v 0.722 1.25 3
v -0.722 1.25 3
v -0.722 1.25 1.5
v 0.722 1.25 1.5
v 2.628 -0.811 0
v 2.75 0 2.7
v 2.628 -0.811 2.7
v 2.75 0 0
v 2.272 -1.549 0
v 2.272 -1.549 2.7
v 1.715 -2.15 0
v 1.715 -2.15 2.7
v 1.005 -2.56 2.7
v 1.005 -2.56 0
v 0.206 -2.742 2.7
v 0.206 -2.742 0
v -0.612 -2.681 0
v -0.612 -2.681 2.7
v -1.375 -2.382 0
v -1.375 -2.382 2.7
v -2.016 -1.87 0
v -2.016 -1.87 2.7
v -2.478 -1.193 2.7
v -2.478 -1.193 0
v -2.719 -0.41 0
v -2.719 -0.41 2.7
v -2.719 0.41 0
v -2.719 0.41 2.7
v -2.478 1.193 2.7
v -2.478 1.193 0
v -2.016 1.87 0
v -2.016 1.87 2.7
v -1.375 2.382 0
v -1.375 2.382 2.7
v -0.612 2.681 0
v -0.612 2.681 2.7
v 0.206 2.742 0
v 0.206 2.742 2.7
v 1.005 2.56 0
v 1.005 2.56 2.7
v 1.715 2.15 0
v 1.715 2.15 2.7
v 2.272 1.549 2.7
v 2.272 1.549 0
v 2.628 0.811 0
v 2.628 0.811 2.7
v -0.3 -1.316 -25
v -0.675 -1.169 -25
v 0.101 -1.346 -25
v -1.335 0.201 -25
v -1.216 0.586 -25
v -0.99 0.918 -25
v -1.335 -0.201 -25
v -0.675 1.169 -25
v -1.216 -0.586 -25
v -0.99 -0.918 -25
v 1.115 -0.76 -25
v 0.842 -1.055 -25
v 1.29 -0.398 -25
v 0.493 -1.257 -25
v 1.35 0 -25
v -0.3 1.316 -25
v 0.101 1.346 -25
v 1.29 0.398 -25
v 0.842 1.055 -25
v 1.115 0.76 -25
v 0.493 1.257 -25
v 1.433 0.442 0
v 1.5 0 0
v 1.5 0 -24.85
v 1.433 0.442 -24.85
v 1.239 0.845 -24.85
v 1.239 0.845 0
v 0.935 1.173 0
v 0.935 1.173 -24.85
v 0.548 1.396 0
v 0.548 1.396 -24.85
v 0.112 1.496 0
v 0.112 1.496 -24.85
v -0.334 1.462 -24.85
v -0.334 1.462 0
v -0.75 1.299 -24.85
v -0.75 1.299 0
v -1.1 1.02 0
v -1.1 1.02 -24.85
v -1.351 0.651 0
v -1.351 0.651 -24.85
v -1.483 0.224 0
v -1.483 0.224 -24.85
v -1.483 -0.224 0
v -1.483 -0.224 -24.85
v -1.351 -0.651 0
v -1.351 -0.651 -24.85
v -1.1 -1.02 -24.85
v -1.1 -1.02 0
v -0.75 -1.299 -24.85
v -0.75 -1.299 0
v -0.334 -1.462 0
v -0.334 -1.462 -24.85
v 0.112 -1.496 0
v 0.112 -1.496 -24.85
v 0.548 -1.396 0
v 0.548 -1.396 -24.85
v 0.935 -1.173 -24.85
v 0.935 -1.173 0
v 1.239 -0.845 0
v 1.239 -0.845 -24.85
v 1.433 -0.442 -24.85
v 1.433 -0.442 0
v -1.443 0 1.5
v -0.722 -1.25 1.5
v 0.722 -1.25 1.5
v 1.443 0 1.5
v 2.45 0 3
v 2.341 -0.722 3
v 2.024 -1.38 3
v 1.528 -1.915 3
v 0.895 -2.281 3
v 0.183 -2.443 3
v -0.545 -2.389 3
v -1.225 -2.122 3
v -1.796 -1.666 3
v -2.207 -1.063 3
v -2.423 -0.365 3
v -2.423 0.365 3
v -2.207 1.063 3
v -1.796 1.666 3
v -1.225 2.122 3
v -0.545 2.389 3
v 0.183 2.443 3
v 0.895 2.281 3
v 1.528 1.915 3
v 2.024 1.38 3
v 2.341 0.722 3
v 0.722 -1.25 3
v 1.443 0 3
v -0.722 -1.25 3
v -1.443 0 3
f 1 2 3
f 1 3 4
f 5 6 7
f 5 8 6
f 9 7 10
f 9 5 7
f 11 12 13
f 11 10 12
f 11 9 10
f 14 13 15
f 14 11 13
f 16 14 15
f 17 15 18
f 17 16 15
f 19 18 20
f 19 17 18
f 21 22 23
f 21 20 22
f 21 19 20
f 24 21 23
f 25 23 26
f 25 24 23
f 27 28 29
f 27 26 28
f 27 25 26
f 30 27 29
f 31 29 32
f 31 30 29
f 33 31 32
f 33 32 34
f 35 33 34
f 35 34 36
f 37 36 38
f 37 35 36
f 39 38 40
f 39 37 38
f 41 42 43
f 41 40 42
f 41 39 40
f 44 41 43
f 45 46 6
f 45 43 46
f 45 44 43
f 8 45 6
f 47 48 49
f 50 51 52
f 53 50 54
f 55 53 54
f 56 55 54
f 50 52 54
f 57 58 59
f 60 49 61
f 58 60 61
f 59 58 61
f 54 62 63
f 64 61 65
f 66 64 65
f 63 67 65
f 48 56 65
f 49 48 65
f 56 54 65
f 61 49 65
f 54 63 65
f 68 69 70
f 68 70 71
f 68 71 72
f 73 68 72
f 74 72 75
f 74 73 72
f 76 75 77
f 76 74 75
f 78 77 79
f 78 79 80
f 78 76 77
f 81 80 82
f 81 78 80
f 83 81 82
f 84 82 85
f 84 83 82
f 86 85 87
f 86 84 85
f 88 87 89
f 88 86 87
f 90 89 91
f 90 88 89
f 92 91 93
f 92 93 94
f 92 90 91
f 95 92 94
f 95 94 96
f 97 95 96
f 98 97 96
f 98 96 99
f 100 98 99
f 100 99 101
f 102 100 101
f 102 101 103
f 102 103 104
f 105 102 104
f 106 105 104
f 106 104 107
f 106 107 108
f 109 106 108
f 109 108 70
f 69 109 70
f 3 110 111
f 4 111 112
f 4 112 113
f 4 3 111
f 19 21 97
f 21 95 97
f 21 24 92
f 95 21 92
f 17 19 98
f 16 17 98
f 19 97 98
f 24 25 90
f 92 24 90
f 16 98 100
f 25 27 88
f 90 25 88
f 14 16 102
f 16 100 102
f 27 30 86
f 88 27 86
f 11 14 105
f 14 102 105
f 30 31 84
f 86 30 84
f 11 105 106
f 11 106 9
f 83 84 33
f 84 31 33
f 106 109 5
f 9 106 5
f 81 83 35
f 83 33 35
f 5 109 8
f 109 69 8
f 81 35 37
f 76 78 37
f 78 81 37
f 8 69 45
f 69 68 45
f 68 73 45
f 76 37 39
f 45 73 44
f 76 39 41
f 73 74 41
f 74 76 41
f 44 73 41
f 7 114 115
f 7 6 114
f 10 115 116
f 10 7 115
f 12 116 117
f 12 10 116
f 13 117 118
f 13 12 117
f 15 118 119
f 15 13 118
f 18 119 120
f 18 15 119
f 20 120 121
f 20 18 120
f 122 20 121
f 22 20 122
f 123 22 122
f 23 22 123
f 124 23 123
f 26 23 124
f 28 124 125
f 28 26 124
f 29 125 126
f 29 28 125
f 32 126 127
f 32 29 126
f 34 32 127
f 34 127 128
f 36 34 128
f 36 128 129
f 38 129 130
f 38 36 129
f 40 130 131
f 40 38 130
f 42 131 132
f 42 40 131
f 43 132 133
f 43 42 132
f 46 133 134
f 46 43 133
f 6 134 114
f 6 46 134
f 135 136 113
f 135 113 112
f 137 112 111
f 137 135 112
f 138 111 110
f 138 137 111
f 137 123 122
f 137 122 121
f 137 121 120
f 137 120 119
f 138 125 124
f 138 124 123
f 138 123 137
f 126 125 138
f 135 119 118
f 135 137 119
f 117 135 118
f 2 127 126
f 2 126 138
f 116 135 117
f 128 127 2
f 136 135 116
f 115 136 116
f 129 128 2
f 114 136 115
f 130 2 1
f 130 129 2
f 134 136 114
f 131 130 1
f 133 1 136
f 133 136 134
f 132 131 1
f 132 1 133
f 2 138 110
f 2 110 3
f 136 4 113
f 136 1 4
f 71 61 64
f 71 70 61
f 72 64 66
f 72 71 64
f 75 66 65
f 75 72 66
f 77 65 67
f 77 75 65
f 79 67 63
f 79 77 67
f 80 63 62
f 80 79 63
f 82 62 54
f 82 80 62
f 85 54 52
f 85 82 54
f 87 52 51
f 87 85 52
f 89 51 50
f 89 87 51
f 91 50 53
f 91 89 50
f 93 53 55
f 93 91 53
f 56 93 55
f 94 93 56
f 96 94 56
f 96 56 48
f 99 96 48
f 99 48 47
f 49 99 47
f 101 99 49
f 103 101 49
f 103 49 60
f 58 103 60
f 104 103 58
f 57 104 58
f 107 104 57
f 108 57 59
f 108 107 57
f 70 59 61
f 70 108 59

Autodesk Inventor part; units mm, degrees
ref_plane "YZ Plane" through (0, 0, 0) normal (1, 0, 0) x (0, 1, 0)
ref_plane "XZ Plane" through (0, 0, 0) normal (0, 1, 0) x (-1, 0, 0)
ref_plane "XY Plane" through (0, 0, 0) normal (0, 0, 1) x (1, 0, 0)
sketch "Sketch3" plane through (0, 0, 0) normal (0, 0, 1) x (1, 0, 0)
  circle A0 centre (0, 0) radius 1.5
  dimension "Diameter" = 3
extrude "Extrusion1" add sketch "Sketch3" against normal blind 25
sketch "Sketch4" plane through (0, 0, 0) normal (0, 0, 1) x (1, 0, 0)
  circle A0 centre (0, 0) radius 1.5 projected
  circle A1 centre (0, 0) radius 2.75
  dimension "Head_Diameter" = 5.5
extrude "Extrusion2" add sketch "Sketch4" along normal blind 3 contours A0 | A1
sketch "Sketch5" plane through (0, 0, 3) normal (0, 0, 1) x (1, 0, 0)
  circle A0 centre (0, 0) radius 2.75 projected
  line L0 (1.4434, 0) -> (0.7217, -1.25)
  line L1 (0.7217, -1.25) -> (-0.7217, -1.25)
  line L2 (-0.7217, -1.25) -> (-1.4434, 0)
  line L3 (-1.4434, 0) -> (-0.7217, 1.25)
  line L4 (-0.7217, 1.25) -> (0.7217, 1.25)
  line L5 (0.7217, 1.25) -> (1.4434, 0)
  line L6 (0, 0) -> (1.4434, 0) construction
  dimension "Hex_Width" = 2.5
extrude "Extrusion3" cut sketch "Sketch5" against normal blind 1.5 contours L0 L1 L2 L3 L4 L5
thread "Thread1" size "M3x0.5" class "4g6g" standard "ANSI Metric M Profile" length 20
chamfer "Chamfer1" distance 0.3 angle 45 1 edges at (-2.75, 0, 3)
chamfer "Chamfer2" distance 0.15 angle 45 1 edges at (-1.5, 0, -25)
equation "\"d14\" = 0.5 * Chamfer"
equation "\"Chamfer\" = 0.3"
properties part number "SCREW,SOCKET-HD,P,12_9,M03X0_5X25MM" material "Steel, MS"
